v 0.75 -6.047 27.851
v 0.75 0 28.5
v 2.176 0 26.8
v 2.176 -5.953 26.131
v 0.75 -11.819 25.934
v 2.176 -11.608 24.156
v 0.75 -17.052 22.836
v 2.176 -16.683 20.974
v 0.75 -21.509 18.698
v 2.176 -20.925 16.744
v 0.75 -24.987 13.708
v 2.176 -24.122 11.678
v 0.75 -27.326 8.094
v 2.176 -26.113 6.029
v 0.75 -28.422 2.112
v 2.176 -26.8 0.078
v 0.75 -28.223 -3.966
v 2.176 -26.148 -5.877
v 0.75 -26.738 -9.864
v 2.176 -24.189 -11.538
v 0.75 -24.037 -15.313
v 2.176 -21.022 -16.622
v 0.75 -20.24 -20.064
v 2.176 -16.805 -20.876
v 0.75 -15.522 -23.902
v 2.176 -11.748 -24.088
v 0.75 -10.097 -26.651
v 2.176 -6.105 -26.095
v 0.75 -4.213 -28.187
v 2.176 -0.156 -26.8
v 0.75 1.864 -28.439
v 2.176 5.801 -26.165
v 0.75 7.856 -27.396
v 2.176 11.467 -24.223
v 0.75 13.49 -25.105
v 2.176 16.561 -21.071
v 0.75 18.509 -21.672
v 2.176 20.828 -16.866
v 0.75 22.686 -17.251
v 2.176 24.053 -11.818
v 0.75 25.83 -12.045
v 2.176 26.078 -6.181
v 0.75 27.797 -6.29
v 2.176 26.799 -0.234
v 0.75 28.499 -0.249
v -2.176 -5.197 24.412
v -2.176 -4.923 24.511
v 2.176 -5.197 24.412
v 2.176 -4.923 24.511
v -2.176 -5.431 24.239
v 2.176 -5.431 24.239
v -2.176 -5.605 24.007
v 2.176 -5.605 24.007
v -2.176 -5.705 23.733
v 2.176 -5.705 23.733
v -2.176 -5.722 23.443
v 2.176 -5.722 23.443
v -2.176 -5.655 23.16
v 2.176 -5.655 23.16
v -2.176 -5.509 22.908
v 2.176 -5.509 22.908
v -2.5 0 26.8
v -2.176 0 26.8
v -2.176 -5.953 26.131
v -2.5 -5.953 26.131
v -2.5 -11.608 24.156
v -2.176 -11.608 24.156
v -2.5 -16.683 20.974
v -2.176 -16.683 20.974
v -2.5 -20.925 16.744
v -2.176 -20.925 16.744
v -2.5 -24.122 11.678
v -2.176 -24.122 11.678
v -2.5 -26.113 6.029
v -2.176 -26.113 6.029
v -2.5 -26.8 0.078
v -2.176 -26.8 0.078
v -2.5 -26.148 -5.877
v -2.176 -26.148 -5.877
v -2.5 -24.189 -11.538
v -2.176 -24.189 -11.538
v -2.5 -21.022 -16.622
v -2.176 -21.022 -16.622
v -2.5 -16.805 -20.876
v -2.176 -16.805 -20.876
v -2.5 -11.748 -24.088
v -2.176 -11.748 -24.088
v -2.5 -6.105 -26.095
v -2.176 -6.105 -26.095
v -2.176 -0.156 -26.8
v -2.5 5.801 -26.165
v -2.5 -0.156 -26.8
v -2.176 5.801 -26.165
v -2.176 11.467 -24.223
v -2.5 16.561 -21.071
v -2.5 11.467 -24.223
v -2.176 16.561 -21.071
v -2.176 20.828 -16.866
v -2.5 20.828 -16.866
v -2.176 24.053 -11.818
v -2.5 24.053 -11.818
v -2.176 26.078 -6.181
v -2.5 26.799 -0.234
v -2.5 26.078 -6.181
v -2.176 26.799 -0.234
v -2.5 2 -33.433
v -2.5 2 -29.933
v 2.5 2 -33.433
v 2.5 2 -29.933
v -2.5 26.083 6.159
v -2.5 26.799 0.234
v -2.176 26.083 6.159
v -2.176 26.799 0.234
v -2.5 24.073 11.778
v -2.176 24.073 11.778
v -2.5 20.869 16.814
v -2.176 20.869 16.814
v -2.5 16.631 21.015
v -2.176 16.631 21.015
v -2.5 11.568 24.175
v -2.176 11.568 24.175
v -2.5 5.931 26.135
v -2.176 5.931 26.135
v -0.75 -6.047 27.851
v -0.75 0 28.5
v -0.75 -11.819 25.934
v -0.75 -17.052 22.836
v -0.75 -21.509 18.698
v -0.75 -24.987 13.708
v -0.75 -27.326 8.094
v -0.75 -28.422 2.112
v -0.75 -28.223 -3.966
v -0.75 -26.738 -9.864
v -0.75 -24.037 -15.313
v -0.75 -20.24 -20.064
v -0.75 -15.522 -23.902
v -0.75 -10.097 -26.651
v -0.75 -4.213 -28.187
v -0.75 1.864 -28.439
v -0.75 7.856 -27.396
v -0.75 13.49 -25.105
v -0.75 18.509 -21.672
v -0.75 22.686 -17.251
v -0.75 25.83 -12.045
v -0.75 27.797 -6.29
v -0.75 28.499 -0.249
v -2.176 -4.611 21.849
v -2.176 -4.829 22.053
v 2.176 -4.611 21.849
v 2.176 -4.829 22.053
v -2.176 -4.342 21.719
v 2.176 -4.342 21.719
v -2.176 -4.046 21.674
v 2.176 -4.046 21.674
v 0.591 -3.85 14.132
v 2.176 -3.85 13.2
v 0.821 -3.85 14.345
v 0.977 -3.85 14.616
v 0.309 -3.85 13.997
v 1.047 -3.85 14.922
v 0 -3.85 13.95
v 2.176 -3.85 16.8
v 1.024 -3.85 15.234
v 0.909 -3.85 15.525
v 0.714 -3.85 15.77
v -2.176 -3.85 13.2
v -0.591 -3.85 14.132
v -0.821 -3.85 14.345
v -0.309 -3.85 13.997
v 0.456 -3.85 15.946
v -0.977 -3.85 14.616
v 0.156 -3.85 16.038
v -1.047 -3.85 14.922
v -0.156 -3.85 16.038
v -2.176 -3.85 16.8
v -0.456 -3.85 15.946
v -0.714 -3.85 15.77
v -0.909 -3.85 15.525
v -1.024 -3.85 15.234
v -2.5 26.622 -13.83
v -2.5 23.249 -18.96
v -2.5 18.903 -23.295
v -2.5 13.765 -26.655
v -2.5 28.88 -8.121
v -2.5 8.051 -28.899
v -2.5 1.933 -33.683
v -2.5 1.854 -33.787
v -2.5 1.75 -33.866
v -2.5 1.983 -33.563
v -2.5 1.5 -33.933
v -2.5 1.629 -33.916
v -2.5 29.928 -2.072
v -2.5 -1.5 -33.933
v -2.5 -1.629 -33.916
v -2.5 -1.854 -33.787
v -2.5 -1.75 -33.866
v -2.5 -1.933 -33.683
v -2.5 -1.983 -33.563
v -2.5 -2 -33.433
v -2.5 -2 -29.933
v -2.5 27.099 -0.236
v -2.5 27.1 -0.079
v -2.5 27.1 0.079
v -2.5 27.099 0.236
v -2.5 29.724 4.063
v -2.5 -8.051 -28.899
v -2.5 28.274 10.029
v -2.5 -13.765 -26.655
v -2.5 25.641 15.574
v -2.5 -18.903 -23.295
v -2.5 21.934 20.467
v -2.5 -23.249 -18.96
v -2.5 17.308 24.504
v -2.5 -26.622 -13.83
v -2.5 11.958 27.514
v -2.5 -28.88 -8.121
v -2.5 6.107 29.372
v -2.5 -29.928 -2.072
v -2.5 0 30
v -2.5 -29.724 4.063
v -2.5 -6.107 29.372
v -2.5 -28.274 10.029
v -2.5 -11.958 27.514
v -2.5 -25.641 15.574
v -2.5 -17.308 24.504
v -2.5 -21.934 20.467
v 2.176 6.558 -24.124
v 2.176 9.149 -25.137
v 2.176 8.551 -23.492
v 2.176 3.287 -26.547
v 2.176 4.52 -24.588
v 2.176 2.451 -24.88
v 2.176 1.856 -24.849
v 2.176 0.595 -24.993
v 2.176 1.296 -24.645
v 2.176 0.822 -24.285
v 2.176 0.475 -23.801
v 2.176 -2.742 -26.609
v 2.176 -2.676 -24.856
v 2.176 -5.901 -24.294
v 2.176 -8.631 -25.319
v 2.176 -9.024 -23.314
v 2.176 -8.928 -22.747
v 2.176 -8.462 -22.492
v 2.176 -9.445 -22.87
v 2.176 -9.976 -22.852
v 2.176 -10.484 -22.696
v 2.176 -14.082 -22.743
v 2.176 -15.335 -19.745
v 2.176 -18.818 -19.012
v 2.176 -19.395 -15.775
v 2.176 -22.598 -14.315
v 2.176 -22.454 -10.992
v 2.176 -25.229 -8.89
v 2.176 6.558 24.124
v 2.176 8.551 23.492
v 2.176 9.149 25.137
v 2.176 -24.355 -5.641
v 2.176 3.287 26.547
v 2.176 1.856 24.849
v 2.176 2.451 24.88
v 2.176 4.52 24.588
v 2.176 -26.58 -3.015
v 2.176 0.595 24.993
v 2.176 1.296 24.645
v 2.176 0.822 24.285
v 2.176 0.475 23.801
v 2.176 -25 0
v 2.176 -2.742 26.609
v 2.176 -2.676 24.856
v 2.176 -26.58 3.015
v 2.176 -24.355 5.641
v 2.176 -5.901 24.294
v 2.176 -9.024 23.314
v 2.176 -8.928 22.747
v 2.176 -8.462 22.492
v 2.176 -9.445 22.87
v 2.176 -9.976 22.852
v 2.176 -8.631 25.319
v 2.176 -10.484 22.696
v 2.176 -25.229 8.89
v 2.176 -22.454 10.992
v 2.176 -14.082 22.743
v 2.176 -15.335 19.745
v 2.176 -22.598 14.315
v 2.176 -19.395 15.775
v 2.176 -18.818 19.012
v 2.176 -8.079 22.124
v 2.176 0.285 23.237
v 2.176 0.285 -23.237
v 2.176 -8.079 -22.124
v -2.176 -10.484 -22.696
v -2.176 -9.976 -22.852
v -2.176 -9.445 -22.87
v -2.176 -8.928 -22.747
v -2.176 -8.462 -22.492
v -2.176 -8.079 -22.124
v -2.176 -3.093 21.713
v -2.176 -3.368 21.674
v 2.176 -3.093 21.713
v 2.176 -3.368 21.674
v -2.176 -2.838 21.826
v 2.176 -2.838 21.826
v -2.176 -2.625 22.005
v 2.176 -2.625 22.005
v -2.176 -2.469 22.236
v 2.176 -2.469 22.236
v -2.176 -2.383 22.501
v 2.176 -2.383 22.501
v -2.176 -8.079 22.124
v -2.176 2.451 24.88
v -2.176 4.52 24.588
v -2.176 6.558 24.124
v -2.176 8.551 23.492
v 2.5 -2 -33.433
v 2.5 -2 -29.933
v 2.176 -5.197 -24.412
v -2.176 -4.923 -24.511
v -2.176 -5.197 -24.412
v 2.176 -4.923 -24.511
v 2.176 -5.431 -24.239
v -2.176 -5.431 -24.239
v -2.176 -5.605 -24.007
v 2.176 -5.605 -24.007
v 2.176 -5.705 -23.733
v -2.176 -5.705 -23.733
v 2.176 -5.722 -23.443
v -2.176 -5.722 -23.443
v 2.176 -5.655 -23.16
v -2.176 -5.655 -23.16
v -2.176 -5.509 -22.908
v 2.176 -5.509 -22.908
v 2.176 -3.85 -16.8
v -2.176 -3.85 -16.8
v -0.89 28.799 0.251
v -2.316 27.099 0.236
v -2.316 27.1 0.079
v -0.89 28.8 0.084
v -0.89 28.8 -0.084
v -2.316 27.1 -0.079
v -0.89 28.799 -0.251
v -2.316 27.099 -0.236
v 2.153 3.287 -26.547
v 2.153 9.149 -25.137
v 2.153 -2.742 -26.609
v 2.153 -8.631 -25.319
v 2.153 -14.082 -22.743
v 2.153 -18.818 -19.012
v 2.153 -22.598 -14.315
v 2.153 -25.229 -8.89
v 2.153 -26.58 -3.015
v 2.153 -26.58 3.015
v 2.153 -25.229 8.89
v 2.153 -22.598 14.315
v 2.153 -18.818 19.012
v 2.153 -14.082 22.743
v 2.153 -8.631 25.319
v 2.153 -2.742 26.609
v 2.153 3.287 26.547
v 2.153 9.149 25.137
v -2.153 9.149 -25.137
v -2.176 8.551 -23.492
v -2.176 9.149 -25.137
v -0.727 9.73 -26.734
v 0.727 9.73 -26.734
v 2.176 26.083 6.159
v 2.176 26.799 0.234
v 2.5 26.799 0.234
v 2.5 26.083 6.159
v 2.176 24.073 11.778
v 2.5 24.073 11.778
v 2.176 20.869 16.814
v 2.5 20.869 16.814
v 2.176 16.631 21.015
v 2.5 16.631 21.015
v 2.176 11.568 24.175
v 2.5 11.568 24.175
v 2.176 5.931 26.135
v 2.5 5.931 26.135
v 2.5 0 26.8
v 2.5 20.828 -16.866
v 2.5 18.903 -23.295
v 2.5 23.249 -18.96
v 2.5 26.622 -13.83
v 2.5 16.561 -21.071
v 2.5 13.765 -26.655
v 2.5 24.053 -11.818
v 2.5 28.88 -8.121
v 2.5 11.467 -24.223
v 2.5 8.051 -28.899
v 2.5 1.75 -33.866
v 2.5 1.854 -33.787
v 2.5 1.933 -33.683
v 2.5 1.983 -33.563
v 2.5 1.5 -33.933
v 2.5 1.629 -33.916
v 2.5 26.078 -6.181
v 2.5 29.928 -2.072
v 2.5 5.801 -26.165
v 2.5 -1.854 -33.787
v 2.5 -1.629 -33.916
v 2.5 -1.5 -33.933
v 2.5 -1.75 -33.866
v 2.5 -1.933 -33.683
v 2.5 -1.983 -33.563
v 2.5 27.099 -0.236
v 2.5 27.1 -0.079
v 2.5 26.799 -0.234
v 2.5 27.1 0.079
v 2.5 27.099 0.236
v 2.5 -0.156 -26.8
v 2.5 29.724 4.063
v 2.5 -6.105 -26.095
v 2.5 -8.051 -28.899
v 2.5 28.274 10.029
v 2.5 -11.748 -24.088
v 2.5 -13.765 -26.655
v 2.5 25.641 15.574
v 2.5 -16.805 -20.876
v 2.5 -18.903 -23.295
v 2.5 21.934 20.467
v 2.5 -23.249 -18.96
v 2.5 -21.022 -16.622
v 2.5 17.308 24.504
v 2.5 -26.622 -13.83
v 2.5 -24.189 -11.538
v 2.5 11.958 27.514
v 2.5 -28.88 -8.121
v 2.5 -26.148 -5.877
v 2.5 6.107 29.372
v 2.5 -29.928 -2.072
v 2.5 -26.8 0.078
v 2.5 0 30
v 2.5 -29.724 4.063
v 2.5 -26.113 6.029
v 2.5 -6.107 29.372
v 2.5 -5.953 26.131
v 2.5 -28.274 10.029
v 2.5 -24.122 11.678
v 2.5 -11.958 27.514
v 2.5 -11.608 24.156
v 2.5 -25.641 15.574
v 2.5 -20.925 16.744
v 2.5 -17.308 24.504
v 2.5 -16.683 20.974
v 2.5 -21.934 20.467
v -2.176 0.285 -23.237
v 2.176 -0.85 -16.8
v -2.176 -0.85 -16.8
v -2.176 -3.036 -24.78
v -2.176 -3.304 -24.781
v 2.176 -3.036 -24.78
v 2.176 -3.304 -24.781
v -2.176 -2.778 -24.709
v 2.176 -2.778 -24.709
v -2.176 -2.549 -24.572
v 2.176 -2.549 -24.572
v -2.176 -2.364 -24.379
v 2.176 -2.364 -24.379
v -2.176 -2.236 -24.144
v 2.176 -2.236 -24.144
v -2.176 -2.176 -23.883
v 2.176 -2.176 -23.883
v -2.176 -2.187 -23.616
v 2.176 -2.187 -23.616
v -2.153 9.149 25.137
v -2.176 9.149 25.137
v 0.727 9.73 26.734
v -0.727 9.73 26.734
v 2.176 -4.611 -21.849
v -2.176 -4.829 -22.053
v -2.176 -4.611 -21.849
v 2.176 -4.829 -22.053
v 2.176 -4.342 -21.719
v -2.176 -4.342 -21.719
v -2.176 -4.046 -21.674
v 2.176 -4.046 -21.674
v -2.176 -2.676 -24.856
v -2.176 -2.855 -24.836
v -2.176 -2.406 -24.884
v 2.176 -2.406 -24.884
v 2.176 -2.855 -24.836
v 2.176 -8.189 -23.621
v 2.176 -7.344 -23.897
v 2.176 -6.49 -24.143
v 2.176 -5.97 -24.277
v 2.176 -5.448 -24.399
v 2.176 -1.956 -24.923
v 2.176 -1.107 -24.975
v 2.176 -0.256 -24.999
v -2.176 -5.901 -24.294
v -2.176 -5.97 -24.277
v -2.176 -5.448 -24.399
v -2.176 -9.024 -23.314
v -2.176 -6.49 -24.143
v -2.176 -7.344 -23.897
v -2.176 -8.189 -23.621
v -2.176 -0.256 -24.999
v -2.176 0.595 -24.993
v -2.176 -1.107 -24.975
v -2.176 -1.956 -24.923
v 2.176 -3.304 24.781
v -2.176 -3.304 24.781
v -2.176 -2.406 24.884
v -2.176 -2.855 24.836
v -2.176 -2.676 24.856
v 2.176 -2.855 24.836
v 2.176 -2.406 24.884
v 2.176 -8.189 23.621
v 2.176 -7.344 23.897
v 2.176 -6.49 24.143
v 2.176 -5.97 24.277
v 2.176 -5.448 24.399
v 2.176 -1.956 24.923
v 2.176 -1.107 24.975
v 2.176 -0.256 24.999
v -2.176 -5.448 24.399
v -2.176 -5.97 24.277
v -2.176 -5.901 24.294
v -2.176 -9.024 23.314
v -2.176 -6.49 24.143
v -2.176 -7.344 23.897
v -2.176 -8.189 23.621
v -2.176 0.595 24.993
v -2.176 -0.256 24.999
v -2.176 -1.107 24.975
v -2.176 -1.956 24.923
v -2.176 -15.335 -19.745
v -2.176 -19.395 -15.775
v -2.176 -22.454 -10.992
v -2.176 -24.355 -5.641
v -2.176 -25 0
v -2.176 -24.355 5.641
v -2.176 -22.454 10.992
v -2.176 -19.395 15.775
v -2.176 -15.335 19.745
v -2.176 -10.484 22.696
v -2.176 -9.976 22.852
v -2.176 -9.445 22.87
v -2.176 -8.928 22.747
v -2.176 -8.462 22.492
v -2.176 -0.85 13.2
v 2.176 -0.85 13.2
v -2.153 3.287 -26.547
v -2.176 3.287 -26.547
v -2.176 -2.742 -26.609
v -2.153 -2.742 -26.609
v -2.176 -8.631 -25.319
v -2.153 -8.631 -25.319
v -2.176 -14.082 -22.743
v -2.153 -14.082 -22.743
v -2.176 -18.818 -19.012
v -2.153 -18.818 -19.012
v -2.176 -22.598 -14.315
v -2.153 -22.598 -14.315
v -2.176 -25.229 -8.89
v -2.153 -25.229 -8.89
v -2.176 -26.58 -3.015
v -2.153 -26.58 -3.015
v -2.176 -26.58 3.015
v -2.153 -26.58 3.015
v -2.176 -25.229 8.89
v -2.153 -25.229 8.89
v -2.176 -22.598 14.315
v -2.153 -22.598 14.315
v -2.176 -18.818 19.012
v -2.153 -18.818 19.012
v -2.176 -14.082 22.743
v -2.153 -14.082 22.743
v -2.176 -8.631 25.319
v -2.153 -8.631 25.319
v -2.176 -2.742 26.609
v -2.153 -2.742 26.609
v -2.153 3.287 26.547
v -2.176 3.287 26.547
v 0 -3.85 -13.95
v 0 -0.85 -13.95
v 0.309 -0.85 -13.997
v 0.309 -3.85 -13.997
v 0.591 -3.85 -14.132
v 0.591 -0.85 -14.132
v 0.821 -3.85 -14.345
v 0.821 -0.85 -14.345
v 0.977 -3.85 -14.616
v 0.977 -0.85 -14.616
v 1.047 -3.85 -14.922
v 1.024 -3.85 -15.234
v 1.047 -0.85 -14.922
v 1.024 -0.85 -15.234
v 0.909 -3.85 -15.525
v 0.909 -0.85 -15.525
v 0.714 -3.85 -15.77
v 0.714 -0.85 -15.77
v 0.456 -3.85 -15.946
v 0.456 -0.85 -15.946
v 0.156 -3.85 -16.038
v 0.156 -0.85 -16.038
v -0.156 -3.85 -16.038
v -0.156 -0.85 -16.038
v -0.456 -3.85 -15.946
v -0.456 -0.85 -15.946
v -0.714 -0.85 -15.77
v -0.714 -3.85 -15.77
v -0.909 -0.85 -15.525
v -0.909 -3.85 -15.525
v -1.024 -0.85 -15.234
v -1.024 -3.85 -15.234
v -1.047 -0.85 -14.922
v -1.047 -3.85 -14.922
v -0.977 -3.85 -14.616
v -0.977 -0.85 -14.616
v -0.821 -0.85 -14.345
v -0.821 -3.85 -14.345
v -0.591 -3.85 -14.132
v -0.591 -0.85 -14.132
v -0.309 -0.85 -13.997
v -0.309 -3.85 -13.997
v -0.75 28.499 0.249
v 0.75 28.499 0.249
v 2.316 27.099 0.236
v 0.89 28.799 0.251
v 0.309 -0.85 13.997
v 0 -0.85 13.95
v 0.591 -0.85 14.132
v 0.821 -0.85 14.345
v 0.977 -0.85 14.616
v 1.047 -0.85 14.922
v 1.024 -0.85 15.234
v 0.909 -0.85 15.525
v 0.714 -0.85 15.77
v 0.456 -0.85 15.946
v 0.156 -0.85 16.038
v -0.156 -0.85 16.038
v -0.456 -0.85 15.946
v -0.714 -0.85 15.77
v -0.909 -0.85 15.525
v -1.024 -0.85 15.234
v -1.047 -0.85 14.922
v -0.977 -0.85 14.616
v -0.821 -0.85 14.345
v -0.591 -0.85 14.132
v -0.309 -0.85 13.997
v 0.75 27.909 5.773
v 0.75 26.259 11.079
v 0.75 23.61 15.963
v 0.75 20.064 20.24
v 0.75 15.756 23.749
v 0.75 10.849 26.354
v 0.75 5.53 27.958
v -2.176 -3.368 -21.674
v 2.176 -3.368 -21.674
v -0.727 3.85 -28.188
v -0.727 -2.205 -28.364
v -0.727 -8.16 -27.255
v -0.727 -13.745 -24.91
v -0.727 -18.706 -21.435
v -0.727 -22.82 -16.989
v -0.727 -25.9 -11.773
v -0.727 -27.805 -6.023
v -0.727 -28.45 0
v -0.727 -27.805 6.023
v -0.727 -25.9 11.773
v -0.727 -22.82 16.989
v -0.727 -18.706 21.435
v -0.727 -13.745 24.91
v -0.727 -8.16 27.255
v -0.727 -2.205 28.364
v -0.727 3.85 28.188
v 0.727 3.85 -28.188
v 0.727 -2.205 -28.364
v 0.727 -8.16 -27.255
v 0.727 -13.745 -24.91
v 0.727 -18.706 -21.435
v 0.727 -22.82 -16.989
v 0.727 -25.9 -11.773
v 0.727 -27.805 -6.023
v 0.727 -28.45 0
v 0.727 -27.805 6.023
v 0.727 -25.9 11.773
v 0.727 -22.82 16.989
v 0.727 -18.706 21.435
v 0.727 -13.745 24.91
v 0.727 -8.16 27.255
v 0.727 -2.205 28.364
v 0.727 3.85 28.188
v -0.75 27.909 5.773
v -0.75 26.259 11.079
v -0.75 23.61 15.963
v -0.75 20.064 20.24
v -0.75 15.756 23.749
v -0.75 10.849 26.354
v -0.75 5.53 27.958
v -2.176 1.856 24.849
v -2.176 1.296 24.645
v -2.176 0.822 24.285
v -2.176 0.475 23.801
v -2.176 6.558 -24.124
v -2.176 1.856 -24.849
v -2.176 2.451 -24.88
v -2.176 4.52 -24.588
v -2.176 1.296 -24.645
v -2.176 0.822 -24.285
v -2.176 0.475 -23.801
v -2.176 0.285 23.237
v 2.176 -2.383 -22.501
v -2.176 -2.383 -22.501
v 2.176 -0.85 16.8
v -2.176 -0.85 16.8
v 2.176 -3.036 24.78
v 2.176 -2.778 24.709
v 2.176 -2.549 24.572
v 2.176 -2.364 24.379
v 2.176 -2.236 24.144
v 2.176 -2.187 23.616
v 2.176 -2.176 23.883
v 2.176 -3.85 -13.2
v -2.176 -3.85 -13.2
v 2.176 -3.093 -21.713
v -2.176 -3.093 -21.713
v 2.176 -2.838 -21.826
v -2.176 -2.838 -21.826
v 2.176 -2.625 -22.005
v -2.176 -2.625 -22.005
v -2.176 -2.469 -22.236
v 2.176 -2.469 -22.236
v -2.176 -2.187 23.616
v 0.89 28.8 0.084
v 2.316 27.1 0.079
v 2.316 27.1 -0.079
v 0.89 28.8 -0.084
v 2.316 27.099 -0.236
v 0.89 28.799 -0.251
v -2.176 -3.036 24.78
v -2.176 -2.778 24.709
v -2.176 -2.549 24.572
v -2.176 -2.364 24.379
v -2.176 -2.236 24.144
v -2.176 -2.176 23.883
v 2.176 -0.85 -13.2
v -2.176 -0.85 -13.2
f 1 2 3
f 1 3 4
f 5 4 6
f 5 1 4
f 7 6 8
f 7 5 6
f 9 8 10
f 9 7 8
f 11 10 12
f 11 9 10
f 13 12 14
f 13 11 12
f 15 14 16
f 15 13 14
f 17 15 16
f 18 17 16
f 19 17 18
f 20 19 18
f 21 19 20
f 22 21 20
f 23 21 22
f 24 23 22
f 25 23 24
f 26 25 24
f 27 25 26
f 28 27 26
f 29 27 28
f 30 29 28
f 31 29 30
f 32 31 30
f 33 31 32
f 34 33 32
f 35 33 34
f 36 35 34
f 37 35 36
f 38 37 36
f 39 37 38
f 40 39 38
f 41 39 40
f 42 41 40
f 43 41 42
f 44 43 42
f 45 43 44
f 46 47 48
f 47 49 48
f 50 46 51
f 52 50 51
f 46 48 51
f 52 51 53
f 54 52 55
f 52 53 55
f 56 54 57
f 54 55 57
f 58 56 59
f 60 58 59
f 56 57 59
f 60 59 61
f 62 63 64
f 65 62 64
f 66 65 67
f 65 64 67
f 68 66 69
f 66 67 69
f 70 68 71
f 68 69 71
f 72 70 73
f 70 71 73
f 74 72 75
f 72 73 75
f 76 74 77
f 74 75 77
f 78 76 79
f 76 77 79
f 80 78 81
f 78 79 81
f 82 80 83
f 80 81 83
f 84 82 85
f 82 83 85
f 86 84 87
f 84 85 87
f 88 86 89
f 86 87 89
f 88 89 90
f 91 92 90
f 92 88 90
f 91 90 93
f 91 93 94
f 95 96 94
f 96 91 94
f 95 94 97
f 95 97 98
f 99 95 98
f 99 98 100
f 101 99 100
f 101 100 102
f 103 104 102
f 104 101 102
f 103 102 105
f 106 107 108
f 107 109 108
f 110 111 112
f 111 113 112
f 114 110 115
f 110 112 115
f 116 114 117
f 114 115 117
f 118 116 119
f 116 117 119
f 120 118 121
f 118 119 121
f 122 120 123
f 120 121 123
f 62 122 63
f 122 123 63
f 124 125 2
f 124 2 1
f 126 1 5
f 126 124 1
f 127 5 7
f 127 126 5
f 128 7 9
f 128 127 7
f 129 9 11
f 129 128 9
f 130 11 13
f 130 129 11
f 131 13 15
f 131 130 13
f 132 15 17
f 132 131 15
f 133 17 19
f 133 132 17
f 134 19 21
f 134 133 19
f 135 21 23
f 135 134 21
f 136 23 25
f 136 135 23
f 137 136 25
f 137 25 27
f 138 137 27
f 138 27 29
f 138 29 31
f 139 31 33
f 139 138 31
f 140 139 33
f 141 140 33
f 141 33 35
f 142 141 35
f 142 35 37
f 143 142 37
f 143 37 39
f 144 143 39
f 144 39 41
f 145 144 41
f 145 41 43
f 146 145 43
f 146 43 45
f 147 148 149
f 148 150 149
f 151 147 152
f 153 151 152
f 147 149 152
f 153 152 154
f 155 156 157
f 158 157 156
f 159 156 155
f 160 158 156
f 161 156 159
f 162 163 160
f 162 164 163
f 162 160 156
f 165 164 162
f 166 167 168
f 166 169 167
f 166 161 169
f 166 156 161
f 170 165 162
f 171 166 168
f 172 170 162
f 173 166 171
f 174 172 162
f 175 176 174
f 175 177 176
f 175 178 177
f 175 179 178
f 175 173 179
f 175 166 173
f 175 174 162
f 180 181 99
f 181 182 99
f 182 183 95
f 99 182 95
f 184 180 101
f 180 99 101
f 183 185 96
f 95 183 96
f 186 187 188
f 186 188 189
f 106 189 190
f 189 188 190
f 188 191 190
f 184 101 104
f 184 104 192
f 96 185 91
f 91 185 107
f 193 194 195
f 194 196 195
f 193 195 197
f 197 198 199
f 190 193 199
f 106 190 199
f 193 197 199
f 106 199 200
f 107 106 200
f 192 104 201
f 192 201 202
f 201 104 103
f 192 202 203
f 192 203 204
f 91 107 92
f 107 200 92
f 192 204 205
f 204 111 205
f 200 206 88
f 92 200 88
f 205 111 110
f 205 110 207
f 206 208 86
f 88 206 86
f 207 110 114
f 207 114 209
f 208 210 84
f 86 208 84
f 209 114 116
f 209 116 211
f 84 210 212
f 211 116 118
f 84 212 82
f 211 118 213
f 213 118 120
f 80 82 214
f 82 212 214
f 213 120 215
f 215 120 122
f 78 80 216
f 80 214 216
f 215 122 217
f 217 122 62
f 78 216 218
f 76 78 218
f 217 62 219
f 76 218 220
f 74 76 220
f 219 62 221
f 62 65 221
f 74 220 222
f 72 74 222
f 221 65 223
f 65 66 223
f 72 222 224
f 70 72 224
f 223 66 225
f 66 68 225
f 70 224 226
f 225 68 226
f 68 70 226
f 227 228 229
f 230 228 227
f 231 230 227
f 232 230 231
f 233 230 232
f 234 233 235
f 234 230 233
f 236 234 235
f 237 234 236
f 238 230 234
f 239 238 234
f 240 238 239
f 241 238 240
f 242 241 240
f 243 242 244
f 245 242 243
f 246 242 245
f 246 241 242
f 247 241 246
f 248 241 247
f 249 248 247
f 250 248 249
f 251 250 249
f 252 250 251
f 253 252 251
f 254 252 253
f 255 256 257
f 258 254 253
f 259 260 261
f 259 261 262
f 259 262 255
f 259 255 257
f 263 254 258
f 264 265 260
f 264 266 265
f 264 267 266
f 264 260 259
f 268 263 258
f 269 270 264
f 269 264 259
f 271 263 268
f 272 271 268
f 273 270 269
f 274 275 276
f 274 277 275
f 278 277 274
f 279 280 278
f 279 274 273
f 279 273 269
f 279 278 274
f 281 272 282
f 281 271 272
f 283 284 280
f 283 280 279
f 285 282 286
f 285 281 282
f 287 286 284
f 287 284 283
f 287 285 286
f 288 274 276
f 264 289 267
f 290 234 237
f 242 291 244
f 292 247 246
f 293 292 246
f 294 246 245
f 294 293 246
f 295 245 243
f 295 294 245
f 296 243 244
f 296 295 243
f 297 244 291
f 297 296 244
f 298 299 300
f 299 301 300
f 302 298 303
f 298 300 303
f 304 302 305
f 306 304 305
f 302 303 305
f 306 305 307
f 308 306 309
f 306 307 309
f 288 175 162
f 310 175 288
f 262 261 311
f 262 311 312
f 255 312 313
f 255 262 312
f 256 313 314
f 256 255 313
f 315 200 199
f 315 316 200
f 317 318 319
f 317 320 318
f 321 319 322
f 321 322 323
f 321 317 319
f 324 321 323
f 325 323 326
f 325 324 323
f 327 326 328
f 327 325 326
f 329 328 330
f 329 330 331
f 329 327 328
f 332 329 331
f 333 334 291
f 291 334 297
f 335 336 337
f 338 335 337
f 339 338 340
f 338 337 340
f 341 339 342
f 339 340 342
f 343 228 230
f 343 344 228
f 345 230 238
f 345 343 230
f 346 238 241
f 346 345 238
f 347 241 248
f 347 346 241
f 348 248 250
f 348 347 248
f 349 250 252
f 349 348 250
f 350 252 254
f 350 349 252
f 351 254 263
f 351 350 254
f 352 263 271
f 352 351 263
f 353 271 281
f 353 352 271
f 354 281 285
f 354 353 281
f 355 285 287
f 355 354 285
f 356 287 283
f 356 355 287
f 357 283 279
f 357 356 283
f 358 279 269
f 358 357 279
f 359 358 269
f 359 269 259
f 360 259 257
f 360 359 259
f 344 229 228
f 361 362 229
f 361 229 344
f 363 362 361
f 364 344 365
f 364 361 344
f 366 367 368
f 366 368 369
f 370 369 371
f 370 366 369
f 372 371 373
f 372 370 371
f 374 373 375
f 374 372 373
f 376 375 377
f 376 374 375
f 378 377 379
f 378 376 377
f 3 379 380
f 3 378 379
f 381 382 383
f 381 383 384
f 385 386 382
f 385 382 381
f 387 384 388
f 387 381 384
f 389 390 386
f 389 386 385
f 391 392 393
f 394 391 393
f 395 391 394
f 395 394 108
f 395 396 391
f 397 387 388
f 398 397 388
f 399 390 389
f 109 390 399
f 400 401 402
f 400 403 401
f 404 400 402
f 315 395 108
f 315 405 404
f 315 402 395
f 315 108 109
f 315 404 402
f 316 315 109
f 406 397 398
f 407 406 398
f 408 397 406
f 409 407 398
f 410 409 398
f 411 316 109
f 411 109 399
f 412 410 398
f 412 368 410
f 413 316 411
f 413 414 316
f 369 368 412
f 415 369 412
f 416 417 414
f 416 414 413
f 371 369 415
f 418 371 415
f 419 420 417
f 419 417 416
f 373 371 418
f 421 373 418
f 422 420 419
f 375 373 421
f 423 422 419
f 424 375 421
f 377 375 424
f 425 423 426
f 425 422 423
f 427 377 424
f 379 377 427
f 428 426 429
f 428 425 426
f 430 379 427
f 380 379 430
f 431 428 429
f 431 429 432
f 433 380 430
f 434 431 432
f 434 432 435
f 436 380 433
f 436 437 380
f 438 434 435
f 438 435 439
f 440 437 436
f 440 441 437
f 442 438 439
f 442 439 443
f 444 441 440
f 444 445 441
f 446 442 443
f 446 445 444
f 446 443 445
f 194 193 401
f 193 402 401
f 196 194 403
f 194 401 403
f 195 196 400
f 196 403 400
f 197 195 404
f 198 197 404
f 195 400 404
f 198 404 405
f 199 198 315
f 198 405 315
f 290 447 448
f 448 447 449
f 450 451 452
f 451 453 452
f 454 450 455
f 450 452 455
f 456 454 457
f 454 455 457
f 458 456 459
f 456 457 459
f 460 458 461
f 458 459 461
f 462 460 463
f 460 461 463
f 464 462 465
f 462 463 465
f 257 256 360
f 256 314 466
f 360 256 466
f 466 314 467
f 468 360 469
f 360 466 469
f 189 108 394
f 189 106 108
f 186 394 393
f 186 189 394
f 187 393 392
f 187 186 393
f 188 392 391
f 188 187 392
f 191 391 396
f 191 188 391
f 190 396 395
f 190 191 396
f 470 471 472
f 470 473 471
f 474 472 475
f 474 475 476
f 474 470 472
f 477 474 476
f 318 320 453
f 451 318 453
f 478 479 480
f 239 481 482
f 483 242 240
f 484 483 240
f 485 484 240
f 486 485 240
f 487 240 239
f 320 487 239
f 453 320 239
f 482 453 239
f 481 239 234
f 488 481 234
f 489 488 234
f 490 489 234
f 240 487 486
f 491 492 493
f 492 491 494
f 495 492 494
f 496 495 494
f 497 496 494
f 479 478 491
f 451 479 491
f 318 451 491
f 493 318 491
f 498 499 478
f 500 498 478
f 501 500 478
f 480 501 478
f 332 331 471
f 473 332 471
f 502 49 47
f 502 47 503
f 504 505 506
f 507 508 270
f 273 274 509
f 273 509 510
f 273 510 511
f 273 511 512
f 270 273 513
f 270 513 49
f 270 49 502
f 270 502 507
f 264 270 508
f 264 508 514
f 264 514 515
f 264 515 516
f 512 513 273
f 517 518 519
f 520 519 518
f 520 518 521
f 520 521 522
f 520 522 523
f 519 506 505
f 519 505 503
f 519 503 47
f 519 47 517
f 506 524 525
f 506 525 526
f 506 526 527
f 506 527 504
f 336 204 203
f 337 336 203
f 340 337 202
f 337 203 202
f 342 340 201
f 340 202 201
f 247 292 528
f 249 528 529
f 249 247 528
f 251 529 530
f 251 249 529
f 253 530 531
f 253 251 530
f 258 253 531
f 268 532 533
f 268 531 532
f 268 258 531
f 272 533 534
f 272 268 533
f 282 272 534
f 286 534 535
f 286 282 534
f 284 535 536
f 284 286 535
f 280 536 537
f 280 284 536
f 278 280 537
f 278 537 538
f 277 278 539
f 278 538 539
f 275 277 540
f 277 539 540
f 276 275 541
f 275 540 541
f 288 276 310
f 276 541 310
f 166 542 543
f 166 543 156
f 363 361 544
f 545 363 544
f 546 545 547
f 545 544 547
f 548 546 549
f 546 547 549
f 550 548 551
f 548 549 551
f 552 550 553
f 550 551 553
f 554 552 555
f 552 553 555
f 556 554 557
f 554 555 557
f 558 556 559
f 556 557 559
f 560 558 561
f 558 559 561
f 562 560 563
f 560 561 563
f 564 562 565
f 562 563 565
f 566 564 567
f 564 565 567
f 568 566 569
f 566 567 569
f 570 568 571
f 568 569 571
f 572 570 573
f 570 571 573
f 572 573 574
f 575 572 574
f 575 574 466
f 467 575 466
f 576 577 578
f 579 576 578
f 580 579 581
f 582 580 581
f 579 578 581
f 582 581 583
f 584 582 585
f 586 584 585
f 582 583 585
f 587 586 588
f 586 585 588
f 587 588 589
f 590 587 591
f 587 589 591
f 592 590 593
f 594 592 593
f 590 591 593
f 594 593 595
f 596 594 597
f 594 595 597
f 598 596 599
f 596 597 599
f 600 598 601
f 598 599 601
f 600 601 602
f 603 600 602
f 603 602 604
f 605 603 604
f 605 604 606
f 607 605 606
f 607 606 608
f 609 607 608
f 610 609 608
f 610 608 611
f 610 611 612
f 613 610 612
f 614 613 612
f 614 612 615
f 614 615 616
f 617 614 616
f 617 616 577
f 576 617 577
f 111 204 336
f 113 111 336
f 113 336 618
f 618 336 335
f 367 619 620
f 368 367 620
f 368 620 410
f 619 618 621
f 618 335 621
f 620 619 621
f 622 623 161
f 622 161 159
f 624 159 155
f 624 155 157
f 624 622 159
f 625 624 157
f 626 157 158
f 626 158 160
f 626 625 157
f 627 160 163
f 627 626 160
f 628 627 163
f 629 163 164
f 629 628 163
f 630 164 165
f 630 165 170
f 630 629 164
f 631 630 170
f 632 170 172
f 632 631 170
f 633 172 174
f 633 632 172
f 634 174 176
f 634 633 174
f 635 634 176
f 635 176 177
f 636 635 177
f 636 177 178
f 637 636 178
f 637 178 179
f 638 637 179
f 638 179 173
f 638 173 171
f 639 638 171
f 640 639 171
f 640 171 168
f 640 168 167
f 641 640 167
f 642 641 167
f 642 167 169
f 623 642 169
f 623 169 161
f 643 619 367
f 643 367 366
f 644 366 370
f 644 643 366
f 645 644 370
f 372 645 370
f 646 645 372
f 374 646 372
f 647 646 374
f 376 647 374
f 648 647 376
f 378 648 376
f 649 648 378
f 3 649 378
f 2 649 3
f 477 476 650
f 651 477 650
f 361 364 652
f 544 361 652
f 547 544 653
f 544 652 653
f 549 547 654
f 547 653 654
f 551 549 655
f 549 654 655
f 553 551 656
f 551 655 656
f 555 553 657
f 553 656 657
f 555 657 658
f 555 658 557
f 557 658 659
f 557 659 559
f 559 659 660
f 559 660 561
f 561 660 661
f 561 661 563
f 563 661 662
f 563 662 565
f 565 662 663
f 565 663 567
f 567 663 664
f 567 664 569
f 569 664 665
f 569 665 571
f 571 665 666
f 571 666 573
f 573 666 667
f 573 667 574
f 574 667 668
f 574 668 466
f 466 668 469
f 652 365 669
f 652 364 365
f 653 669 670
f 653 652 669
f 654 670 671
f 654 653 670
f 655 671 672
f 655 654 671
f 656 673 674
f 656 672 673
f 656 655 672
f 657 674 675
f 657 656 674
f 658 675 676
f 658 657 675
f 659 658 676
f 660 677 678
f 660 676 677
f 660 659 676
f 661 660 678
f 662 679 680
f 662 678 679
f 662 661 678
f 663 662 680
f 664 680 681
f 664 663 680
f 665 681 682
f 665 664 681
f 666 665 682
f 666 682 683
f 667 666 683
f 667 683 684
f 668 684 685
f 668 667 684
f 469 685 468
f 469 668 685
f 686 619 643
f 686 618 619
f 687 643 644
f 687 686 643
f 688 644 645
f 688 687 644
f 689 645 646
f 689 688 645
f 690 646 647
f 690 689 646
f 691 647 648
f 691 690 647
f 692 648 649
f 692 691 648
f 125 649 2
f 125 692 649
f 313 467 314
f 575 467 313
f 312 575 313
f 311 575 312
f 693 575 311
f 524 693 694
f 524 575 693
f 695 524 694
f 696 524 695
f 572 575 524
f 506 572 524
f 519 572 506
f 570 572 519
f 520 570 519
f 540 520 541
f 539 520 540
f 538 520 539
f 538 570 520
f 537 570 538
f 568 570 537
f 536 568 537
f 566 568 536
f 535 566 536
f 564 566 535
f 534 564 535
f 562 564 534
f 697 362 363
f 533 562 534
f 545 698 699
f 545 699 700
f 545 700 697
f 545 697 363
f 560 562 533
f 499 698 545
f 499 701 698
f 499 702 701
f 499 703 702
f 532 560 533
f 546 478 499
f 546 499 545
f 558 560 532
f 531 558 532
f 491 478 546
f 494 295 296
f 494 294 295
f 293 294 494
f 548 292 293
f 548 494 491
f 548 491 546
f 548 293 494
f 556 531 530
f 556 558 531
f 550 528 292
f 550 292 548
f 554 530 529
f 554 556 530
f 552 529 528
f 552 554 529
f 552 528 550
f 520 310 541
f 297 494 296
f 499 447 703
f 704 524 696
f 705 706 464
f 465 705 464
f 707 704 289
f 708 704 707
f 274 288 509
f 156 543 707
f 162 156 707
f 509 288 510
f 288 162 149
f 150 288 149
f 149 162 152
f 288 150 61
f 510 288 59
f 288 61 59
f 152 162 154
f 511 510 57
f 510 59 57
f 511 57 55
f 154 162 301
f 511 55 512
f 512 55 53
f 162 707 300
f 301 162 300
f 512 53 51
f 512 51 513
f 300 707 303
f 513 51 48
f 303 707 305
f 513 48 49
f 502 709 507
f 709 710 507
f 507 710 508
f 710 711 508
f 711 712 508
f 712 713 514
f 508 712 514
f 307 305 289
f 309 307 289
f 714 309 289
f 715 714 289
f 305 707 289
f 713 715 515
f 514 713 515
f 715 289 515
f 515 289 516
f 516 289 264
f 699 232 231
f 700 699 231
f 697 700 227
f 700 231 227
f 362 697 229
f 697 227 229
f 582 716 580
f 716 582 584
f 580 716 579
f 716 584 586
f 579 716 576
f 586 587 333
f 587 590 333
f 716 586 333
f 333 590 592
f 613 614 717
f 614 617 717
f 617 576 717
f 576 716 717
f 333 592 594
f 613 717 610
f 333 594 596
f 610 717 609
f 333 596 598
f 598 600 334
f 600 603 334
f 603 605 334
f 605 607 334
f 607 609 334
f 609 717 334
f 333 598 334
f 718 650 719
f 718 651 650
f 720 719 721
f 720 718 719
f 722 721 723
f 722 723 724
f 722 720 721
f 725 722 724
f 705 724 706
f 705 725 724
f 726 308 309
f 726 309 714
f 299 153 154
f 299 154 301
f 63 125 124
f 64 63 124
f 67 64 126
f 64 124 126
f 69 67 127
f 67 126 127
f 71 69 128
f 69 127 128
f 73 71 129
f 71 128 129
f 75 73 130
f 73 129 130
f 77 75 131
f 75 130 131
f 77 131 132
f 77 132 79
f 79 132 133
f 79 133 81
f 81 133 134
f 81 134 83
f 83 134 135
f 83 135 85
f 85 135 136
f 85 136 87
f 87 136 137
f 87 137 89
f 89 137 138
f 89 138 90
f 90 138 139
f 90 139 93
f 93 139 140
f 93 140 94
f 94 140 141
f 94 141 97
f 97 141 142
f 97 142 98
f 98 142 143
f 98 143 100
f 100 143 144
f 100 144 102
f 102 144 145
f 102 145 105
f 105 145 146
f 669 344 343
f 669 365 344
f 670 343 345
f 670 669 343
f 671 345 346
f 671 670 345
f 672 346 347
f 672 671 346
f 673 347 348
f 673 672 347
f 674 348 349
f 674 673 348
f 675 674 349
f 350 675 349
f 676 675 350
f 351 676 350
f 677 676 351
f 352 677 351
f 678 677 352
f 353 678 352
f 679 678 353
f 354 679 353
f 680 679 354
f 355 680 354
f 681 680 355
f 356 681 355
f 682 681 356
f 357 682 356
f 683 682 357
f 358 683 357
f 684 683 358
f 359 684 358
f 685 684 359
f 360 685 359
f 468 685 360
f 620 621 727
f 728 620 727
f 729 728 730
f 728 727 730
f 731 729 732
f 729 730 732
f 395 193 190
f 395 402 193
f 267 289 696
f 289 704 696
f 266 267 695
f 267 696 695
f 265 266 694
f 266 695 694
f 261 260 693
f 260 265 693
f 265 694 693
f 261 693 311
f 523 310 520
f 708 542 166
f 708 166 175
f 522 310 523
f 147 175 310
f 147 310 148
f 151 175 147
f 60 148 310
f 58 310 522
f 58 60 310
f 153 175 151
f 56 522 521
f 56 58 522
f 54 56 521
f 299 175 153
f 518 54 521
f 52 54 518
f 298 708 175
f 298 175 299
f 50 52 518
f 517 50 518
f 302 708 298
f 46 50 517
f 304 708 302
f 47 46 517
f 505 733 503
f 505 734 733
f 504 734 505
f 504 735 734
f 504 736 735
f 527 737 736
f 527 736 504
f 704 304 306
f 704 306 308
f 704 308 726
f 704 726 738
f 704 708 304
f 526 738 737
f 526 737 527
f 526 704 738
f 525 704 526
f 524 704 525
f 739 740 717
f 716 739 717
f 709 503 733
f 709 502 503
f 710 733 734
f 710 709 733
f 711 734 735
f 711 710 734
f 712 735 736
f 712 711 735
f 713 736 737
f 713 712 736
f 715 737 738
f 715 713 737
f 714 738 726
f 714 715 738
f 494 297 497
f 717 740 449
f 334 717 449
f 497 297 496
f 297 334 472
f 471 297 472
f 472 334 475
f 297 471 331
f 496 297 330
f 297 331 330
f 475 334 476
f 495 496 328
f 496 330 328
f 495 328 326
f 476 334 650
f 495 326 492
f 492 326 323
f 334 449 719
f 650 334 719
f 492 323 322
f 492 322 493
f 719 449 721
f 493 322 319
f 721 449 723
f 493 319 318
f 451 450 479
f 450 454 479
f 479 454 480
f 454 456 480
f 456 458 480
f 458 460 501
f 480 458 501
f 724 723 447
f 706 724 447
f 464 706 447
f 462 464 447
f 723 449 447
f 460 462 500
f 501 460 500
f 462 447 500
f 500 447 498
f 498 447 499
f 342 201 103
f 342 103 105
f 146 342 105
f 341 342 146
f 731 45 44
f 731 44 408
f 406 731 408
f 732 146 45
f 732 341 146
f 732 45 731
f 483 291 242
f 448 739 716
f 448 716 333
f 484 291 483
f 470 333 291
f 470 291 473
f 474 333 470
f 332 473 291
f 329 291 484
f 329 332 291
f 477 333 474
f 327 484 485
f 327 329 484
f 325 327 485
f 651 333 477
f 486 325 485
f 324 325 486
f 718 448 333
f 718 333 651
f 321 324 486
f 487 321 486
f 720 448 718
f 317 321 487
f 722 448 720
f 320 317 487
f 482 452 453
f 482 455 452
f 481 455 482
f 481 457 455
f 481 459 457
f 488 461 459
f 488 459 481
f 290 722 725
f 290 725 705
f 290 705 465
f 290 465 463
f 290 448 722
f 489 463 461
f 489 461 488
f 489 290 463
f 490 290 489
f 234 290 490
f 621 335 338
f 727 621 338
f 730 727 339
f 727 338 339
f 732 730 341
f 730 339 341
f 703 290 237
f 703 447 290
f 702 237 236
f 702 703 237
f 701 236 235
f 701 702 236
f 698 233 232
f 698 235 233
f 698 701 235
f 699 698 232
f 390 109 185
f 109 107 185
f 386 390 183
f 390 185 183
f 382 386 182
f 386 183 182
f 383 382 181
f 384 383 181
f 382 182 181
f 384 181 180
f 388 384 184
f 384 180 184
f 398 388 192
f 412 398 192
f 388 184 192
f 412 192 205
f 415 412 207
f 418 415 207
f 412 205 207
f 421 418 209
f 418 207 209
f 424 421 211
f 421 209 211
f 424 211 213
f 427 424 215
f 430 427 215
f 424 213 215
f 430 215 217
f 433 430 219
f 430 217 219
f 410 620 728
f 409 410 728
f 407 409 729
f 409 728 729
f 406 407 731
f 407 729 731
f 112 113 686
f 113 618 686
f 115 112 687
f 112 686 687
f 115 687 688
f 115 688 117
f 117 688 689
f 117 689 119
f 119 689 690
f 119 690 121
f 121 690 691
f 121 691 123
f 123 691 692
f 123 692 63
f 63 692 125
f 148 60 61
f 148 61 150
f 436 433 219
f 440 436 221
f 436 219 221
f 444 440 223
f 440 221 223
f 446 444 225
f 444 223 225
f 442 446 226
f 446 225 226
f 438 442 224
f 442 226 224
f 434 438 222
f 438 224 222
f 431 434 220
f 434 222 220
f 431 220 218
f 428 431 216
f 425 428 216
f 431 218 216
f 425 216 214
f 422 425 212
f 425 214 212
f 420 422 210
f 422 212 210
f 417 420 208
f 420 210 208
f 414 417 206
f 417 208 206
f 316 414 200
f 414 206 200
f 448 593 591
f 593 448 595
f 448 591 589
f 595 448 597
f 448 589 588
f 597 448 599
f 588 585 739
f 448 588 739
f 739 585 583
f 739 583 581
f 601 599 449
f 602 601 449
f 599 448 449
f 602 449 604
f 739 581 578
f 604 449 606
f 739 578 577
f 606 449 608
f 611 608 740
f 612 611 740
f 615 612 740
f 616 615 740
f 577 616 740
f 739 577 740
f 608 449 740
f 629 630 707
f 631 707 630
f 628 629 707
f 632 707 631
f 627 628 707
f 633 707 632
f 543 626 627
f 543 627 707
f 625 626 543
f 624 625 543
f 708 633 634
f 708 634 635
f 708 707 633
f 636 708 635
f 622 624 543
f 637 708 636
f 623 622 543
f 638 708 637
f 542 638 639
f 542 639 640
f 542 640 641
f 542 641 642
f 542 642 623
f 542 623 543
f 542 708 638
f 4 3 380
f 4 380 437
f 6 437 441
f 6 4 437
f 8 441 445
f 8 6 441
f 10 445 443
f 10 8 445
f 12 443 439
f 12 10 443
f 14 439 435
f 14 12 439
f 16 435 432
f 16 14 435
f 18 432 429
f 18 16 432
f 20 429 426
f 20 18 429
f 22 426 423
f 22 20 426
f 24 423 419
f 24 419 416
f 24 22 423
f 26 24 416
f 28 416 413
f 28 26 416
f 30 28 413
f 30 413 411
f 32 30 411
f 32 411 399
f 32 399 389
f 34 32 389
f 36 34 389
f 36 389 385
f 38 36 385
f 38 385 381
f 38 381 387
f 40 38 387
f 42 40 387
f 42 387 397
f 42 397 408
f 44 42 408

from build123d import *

# Parameters (mm, degrees)
REVOLVE2_ANGLE      = 110
BOSS_EXTRUDE1_START = -2.176469
BOSS_EXTRUDE1_DEPTH = 4.352938
FILLET1_R           = 2
FILLET2_R           = 1
CUT_EXTRUDE1_REACH  = 44.5
SKETCH4_R           = 1.05
SKETCH5_W           = 4
SKETCH5_H           = 4
BOSS_EXTRUDE2_DEPTH = 2.5
FILLET3_R           = 0.5
CUT_REVOLVE2_ANGLE  = 1


# Read off the part's stored shape, not the designer's step: Revolve2
with BuildPart() as part:
    # Sketch2 → Revolve1 (revolve)
    with BuildSketch(Plane(origin=(0, 0, 0), x_dir=(1, 0, 0), z_dir=(0, 1, 0)), mode=Mode.PRIVATE) as revolve1_sk:
        Polygon((-0.75, 28.5), (0, 28.5), (0, 30), (-2.5, 30), (-2.5, 26.8), (-2.176469373, 26.8), align=None)
    revolve1 = revolve(revolve1_sk.sketch.rotate(Axis((0, 0, 0), (1, 0, 0)), 180), axis=Axis((0, 0, 0), (1, 0, 0)))


with BuildPart() as body_2:
    # Revolve2 outline → Revolve2 (revolve)
    with BuildSketch(Plane(origin=(0, 0, 0), x_dir=(0, -1, 0), z_dir=(0, 0, 1))):
        Polygon((25, 0), (25, -2.176469373), (26.75, -2.176469373), (26.75, -2.15315399), (28.45, -0.726684617), (28.45, 0), align=None)
    revolve2 = revolve(axis=Axis((0, 0, 0), (1, 0, 0)), revolution_arc=REVOLVE2_ANGLE)


with BuildPart() as part_1:
    add(part.part)

    add(body_2.part)  # Mirror1 merges body 2
    # Mirror1: Revolve1, Revolve2 across plane
    add(revolve1.mirror(Plane(origin=(0, 0, 0), x_dir=(0, 0, 1), z_dir=(1, 0, 0))))
    add(revolve2.mirror(Plane(origin=(0, 0, 0), x_dir=(0, 0, 1), z_dir=(1, 0, 0))))

    # Sketch3 → Boss-Extrude1 (add)
    with BuildSketch(Plane(origin=(0, 0, 0), x_dir=(0, 0, -1), z_dir=(1, 0, 0)).offset(BOSS_EXTRUDE1_START)):
        with BuildLine():
            Line((24.992927205, 0.594634117), (16.8, -0.85))
            Line((16.8, -0.85), (13.2, -0.85))
            Line((13.2, -0.85), (13.2, -3.85))
            Line((13.2, -3.85), (16.8, -3.85))
            Line((16.8, -3.85), (23.314414659, -9.024304356))
            ThreePointArc((23.314414659, -9.024304356), (23.762509208, -7.768085746), (24.142970944, -6.489757623))
            Line((24.142970944, -6.489757623), (21.674472629, -4.529065489))
            Line((21.674472629, -4.529065489), (21.674472629, -2.529065489))
            Line((21.674472629, -2.529065489), (24.923348035, -1.956201097))
            ThreePointArc((24.923348035, -1.956201097), (24.990704742, -0.681671824), (24.992927205, 0.594634117))
        make_face()
    extrude(amount=BOSS_EXTRUDE1_DEPTH)

    # Fillet1
    # the kernel refuses this fillet: 2 mm, written as the material it adds along each edge
    with BuildSketch(Plane(origin=(-6.825018134, 0.594634117, -24.992927205), x_dir=(0, 0.9981410168670989, 0.06094678373395691), z_dir=(1, 0, 0))) as fillet1_piece_1_section:
        with BuildLine():
            CenterArc((1.785042868, 1.998616545), FILLET1_R, 186.505841055, 85.625388348)
            Line((-0.202077752, 1.772007538), (0, 0))
            ThreePointArc((0, 0), (0.929709827, -0.017293188), (1.859419654, 0))
        make_face()
    fillet1_piece_1 = extrude(amount=13.650036268, mode=Mode.PRIVATE)
    fillet1_piece_1 = split(fillet1_piece_1, bisect_by=Plane(origin=(-2.176469373, 0.943690029, -24.587007533), z_dir=(1, 0, 0)), keep=Keep.TOP, mode=Mode.PRIVATE)
    fillet1_piece_1 = split(fillet1_piece_1, bisect_by=Plane(origin=(2.176469373, 0.943690029, -24.587007533), z_dir=(-1, 0, 0)), keep=Keep.TOP, mode=Mode.PRIVATE)
    add(fillet1_piece_1)
    with BuildSketch(Plane(origin=(-6.138912646, -9.024304356, -23.314414659), x_dir=(0, -0.9206652582937426, 0.39035302249491577), z_dir=(1, 0, 0))) as fillet1_piece_2_section:
        with BuildLine():
            CenterArc((1.52157836, -1.998994886), FILLET1_R, 88.183445303, 76.333419365)
            Line((-0.405839783, -1.465085435), (0, 0))
            ThreePointArc((0, 0), (0.792488729, 0.012563925), (1.584977458, 0))
        make_face()
    fillet1_piece_2 = extrude(amount=12.277825292, mode=Mode.PRIVATE)
    fillet1_piece_2 = split(fillet1_piece_2, bisect_by=Plane(origin=(-2.176469373, -9.144329866, -22.922792538), z_dir=(1, 0, 0)), keep=Keep.TOP, mode=Mode.PRIVATE)
    fillet1_piece_2 = split(fillet1_piece_2, bisect_by=Plane(origin=(2.176469373, -9.144329866, -22.922792538), z_dir=(-1, 0, 0)), keep=Keep.TOP, mode=Mode.PRIVATE)
    add(fillet1_piece_2)

    # Fillet2
    fillet2_edges = [part_1.edges().sort_by_distance(p)[0] for p in [
        (0, -1.956201097, -24.923348035),
        (0, -2.529065489, -21.674472629),
        (0, -4.529065489, -21.674472629),
        (0, -6.489757623, -24.142970944),
    ]]
    fillet(fillet2_edges, radius=FILLET2_R)

    # Sketch4 → Cut-Extrude1 (cut, up to next)
    with BuildSketch(Plane(origin=(0, 0, 0), x_dir=(1, 0, 0), z_dir=(0, 1, 0)), mode=Mode.PRIVATE) as cut_extrude1_sk1:
        with Locations(Location((0, 15, 0), (0, 0, 270))):
            Circle(SKETCH4_R)
    cut_extrude1_tool1 = extrude(cut_extrude1_sk1.sketch, amount=-CUT_EXTRUDE1_REACH, mode=Mode.PRIVATE) & part_1.part
    add(cut_extrude1_tool1.solids().sort_by_distance((0, 0, -15))[0], mode=Mode.SUBTRACT)

    # Mirror2: part across plane


with BuildPart() as part_2:
    add(part_1.part)
    add(part_1.part.mirror(Plane.XY))

    # Sketch5 → Boss-Extrude2 (add, symmetric)
    with BuildSketch(Plane(origin=(0, 0, 0), x_dir=(0, 0, -1), z_dir=(1, 0, 0))):
        with Locations((31.933259094, 0)):
            Rectangle(SKETCH5_W, SKETCH5_H)
    extrude(amount=BOSS_EXTRUDE2_DEPTH, both=True)

    # Fillet3
    fillet3_edges = [part_2.edges().sort_by_distance(p)[0] for p in [
        (0, 2, -33.933259094),
        (0, -2, -33.933259094),
    ]]
    fillet(fillet3_edges, radius=FILLET3_R)

    # Sketch6 → Cut-Revolve2 (revolve, symmetric, cut)
    with BuildSketch(Plane.XY) as cut_revolve2_sk:
        Polygon((2.5, 27.1), (2.31636167, 27.1), (0.889892297, 28.8), (-0.889892297, 28.8), (-2.31636167, 27.1), (-2.5, 27.1), (-2.5, 26.8), (-2.176469373, 26.8), (-0.75, 28.5), (0.75, 28.5), (2.176469373, 26.8), (2.5, 26.8), align=None)
    revolve(axis=Axis((0, 0, 0), (1, 0, 0)), revolution_arc=CUT_REVOLVE2_ANGLE / 2, mode=Mode.SUBTRACT)
    revolve(cut_revolve2_sk.sketch, axis=Axis((0, 0, 0), (-1, 0, 0)), revolution_arc=CUT_REVOLVE2_ANGLE / 2, mode=Mode.SUBTRACT)


solid = part_2.part
